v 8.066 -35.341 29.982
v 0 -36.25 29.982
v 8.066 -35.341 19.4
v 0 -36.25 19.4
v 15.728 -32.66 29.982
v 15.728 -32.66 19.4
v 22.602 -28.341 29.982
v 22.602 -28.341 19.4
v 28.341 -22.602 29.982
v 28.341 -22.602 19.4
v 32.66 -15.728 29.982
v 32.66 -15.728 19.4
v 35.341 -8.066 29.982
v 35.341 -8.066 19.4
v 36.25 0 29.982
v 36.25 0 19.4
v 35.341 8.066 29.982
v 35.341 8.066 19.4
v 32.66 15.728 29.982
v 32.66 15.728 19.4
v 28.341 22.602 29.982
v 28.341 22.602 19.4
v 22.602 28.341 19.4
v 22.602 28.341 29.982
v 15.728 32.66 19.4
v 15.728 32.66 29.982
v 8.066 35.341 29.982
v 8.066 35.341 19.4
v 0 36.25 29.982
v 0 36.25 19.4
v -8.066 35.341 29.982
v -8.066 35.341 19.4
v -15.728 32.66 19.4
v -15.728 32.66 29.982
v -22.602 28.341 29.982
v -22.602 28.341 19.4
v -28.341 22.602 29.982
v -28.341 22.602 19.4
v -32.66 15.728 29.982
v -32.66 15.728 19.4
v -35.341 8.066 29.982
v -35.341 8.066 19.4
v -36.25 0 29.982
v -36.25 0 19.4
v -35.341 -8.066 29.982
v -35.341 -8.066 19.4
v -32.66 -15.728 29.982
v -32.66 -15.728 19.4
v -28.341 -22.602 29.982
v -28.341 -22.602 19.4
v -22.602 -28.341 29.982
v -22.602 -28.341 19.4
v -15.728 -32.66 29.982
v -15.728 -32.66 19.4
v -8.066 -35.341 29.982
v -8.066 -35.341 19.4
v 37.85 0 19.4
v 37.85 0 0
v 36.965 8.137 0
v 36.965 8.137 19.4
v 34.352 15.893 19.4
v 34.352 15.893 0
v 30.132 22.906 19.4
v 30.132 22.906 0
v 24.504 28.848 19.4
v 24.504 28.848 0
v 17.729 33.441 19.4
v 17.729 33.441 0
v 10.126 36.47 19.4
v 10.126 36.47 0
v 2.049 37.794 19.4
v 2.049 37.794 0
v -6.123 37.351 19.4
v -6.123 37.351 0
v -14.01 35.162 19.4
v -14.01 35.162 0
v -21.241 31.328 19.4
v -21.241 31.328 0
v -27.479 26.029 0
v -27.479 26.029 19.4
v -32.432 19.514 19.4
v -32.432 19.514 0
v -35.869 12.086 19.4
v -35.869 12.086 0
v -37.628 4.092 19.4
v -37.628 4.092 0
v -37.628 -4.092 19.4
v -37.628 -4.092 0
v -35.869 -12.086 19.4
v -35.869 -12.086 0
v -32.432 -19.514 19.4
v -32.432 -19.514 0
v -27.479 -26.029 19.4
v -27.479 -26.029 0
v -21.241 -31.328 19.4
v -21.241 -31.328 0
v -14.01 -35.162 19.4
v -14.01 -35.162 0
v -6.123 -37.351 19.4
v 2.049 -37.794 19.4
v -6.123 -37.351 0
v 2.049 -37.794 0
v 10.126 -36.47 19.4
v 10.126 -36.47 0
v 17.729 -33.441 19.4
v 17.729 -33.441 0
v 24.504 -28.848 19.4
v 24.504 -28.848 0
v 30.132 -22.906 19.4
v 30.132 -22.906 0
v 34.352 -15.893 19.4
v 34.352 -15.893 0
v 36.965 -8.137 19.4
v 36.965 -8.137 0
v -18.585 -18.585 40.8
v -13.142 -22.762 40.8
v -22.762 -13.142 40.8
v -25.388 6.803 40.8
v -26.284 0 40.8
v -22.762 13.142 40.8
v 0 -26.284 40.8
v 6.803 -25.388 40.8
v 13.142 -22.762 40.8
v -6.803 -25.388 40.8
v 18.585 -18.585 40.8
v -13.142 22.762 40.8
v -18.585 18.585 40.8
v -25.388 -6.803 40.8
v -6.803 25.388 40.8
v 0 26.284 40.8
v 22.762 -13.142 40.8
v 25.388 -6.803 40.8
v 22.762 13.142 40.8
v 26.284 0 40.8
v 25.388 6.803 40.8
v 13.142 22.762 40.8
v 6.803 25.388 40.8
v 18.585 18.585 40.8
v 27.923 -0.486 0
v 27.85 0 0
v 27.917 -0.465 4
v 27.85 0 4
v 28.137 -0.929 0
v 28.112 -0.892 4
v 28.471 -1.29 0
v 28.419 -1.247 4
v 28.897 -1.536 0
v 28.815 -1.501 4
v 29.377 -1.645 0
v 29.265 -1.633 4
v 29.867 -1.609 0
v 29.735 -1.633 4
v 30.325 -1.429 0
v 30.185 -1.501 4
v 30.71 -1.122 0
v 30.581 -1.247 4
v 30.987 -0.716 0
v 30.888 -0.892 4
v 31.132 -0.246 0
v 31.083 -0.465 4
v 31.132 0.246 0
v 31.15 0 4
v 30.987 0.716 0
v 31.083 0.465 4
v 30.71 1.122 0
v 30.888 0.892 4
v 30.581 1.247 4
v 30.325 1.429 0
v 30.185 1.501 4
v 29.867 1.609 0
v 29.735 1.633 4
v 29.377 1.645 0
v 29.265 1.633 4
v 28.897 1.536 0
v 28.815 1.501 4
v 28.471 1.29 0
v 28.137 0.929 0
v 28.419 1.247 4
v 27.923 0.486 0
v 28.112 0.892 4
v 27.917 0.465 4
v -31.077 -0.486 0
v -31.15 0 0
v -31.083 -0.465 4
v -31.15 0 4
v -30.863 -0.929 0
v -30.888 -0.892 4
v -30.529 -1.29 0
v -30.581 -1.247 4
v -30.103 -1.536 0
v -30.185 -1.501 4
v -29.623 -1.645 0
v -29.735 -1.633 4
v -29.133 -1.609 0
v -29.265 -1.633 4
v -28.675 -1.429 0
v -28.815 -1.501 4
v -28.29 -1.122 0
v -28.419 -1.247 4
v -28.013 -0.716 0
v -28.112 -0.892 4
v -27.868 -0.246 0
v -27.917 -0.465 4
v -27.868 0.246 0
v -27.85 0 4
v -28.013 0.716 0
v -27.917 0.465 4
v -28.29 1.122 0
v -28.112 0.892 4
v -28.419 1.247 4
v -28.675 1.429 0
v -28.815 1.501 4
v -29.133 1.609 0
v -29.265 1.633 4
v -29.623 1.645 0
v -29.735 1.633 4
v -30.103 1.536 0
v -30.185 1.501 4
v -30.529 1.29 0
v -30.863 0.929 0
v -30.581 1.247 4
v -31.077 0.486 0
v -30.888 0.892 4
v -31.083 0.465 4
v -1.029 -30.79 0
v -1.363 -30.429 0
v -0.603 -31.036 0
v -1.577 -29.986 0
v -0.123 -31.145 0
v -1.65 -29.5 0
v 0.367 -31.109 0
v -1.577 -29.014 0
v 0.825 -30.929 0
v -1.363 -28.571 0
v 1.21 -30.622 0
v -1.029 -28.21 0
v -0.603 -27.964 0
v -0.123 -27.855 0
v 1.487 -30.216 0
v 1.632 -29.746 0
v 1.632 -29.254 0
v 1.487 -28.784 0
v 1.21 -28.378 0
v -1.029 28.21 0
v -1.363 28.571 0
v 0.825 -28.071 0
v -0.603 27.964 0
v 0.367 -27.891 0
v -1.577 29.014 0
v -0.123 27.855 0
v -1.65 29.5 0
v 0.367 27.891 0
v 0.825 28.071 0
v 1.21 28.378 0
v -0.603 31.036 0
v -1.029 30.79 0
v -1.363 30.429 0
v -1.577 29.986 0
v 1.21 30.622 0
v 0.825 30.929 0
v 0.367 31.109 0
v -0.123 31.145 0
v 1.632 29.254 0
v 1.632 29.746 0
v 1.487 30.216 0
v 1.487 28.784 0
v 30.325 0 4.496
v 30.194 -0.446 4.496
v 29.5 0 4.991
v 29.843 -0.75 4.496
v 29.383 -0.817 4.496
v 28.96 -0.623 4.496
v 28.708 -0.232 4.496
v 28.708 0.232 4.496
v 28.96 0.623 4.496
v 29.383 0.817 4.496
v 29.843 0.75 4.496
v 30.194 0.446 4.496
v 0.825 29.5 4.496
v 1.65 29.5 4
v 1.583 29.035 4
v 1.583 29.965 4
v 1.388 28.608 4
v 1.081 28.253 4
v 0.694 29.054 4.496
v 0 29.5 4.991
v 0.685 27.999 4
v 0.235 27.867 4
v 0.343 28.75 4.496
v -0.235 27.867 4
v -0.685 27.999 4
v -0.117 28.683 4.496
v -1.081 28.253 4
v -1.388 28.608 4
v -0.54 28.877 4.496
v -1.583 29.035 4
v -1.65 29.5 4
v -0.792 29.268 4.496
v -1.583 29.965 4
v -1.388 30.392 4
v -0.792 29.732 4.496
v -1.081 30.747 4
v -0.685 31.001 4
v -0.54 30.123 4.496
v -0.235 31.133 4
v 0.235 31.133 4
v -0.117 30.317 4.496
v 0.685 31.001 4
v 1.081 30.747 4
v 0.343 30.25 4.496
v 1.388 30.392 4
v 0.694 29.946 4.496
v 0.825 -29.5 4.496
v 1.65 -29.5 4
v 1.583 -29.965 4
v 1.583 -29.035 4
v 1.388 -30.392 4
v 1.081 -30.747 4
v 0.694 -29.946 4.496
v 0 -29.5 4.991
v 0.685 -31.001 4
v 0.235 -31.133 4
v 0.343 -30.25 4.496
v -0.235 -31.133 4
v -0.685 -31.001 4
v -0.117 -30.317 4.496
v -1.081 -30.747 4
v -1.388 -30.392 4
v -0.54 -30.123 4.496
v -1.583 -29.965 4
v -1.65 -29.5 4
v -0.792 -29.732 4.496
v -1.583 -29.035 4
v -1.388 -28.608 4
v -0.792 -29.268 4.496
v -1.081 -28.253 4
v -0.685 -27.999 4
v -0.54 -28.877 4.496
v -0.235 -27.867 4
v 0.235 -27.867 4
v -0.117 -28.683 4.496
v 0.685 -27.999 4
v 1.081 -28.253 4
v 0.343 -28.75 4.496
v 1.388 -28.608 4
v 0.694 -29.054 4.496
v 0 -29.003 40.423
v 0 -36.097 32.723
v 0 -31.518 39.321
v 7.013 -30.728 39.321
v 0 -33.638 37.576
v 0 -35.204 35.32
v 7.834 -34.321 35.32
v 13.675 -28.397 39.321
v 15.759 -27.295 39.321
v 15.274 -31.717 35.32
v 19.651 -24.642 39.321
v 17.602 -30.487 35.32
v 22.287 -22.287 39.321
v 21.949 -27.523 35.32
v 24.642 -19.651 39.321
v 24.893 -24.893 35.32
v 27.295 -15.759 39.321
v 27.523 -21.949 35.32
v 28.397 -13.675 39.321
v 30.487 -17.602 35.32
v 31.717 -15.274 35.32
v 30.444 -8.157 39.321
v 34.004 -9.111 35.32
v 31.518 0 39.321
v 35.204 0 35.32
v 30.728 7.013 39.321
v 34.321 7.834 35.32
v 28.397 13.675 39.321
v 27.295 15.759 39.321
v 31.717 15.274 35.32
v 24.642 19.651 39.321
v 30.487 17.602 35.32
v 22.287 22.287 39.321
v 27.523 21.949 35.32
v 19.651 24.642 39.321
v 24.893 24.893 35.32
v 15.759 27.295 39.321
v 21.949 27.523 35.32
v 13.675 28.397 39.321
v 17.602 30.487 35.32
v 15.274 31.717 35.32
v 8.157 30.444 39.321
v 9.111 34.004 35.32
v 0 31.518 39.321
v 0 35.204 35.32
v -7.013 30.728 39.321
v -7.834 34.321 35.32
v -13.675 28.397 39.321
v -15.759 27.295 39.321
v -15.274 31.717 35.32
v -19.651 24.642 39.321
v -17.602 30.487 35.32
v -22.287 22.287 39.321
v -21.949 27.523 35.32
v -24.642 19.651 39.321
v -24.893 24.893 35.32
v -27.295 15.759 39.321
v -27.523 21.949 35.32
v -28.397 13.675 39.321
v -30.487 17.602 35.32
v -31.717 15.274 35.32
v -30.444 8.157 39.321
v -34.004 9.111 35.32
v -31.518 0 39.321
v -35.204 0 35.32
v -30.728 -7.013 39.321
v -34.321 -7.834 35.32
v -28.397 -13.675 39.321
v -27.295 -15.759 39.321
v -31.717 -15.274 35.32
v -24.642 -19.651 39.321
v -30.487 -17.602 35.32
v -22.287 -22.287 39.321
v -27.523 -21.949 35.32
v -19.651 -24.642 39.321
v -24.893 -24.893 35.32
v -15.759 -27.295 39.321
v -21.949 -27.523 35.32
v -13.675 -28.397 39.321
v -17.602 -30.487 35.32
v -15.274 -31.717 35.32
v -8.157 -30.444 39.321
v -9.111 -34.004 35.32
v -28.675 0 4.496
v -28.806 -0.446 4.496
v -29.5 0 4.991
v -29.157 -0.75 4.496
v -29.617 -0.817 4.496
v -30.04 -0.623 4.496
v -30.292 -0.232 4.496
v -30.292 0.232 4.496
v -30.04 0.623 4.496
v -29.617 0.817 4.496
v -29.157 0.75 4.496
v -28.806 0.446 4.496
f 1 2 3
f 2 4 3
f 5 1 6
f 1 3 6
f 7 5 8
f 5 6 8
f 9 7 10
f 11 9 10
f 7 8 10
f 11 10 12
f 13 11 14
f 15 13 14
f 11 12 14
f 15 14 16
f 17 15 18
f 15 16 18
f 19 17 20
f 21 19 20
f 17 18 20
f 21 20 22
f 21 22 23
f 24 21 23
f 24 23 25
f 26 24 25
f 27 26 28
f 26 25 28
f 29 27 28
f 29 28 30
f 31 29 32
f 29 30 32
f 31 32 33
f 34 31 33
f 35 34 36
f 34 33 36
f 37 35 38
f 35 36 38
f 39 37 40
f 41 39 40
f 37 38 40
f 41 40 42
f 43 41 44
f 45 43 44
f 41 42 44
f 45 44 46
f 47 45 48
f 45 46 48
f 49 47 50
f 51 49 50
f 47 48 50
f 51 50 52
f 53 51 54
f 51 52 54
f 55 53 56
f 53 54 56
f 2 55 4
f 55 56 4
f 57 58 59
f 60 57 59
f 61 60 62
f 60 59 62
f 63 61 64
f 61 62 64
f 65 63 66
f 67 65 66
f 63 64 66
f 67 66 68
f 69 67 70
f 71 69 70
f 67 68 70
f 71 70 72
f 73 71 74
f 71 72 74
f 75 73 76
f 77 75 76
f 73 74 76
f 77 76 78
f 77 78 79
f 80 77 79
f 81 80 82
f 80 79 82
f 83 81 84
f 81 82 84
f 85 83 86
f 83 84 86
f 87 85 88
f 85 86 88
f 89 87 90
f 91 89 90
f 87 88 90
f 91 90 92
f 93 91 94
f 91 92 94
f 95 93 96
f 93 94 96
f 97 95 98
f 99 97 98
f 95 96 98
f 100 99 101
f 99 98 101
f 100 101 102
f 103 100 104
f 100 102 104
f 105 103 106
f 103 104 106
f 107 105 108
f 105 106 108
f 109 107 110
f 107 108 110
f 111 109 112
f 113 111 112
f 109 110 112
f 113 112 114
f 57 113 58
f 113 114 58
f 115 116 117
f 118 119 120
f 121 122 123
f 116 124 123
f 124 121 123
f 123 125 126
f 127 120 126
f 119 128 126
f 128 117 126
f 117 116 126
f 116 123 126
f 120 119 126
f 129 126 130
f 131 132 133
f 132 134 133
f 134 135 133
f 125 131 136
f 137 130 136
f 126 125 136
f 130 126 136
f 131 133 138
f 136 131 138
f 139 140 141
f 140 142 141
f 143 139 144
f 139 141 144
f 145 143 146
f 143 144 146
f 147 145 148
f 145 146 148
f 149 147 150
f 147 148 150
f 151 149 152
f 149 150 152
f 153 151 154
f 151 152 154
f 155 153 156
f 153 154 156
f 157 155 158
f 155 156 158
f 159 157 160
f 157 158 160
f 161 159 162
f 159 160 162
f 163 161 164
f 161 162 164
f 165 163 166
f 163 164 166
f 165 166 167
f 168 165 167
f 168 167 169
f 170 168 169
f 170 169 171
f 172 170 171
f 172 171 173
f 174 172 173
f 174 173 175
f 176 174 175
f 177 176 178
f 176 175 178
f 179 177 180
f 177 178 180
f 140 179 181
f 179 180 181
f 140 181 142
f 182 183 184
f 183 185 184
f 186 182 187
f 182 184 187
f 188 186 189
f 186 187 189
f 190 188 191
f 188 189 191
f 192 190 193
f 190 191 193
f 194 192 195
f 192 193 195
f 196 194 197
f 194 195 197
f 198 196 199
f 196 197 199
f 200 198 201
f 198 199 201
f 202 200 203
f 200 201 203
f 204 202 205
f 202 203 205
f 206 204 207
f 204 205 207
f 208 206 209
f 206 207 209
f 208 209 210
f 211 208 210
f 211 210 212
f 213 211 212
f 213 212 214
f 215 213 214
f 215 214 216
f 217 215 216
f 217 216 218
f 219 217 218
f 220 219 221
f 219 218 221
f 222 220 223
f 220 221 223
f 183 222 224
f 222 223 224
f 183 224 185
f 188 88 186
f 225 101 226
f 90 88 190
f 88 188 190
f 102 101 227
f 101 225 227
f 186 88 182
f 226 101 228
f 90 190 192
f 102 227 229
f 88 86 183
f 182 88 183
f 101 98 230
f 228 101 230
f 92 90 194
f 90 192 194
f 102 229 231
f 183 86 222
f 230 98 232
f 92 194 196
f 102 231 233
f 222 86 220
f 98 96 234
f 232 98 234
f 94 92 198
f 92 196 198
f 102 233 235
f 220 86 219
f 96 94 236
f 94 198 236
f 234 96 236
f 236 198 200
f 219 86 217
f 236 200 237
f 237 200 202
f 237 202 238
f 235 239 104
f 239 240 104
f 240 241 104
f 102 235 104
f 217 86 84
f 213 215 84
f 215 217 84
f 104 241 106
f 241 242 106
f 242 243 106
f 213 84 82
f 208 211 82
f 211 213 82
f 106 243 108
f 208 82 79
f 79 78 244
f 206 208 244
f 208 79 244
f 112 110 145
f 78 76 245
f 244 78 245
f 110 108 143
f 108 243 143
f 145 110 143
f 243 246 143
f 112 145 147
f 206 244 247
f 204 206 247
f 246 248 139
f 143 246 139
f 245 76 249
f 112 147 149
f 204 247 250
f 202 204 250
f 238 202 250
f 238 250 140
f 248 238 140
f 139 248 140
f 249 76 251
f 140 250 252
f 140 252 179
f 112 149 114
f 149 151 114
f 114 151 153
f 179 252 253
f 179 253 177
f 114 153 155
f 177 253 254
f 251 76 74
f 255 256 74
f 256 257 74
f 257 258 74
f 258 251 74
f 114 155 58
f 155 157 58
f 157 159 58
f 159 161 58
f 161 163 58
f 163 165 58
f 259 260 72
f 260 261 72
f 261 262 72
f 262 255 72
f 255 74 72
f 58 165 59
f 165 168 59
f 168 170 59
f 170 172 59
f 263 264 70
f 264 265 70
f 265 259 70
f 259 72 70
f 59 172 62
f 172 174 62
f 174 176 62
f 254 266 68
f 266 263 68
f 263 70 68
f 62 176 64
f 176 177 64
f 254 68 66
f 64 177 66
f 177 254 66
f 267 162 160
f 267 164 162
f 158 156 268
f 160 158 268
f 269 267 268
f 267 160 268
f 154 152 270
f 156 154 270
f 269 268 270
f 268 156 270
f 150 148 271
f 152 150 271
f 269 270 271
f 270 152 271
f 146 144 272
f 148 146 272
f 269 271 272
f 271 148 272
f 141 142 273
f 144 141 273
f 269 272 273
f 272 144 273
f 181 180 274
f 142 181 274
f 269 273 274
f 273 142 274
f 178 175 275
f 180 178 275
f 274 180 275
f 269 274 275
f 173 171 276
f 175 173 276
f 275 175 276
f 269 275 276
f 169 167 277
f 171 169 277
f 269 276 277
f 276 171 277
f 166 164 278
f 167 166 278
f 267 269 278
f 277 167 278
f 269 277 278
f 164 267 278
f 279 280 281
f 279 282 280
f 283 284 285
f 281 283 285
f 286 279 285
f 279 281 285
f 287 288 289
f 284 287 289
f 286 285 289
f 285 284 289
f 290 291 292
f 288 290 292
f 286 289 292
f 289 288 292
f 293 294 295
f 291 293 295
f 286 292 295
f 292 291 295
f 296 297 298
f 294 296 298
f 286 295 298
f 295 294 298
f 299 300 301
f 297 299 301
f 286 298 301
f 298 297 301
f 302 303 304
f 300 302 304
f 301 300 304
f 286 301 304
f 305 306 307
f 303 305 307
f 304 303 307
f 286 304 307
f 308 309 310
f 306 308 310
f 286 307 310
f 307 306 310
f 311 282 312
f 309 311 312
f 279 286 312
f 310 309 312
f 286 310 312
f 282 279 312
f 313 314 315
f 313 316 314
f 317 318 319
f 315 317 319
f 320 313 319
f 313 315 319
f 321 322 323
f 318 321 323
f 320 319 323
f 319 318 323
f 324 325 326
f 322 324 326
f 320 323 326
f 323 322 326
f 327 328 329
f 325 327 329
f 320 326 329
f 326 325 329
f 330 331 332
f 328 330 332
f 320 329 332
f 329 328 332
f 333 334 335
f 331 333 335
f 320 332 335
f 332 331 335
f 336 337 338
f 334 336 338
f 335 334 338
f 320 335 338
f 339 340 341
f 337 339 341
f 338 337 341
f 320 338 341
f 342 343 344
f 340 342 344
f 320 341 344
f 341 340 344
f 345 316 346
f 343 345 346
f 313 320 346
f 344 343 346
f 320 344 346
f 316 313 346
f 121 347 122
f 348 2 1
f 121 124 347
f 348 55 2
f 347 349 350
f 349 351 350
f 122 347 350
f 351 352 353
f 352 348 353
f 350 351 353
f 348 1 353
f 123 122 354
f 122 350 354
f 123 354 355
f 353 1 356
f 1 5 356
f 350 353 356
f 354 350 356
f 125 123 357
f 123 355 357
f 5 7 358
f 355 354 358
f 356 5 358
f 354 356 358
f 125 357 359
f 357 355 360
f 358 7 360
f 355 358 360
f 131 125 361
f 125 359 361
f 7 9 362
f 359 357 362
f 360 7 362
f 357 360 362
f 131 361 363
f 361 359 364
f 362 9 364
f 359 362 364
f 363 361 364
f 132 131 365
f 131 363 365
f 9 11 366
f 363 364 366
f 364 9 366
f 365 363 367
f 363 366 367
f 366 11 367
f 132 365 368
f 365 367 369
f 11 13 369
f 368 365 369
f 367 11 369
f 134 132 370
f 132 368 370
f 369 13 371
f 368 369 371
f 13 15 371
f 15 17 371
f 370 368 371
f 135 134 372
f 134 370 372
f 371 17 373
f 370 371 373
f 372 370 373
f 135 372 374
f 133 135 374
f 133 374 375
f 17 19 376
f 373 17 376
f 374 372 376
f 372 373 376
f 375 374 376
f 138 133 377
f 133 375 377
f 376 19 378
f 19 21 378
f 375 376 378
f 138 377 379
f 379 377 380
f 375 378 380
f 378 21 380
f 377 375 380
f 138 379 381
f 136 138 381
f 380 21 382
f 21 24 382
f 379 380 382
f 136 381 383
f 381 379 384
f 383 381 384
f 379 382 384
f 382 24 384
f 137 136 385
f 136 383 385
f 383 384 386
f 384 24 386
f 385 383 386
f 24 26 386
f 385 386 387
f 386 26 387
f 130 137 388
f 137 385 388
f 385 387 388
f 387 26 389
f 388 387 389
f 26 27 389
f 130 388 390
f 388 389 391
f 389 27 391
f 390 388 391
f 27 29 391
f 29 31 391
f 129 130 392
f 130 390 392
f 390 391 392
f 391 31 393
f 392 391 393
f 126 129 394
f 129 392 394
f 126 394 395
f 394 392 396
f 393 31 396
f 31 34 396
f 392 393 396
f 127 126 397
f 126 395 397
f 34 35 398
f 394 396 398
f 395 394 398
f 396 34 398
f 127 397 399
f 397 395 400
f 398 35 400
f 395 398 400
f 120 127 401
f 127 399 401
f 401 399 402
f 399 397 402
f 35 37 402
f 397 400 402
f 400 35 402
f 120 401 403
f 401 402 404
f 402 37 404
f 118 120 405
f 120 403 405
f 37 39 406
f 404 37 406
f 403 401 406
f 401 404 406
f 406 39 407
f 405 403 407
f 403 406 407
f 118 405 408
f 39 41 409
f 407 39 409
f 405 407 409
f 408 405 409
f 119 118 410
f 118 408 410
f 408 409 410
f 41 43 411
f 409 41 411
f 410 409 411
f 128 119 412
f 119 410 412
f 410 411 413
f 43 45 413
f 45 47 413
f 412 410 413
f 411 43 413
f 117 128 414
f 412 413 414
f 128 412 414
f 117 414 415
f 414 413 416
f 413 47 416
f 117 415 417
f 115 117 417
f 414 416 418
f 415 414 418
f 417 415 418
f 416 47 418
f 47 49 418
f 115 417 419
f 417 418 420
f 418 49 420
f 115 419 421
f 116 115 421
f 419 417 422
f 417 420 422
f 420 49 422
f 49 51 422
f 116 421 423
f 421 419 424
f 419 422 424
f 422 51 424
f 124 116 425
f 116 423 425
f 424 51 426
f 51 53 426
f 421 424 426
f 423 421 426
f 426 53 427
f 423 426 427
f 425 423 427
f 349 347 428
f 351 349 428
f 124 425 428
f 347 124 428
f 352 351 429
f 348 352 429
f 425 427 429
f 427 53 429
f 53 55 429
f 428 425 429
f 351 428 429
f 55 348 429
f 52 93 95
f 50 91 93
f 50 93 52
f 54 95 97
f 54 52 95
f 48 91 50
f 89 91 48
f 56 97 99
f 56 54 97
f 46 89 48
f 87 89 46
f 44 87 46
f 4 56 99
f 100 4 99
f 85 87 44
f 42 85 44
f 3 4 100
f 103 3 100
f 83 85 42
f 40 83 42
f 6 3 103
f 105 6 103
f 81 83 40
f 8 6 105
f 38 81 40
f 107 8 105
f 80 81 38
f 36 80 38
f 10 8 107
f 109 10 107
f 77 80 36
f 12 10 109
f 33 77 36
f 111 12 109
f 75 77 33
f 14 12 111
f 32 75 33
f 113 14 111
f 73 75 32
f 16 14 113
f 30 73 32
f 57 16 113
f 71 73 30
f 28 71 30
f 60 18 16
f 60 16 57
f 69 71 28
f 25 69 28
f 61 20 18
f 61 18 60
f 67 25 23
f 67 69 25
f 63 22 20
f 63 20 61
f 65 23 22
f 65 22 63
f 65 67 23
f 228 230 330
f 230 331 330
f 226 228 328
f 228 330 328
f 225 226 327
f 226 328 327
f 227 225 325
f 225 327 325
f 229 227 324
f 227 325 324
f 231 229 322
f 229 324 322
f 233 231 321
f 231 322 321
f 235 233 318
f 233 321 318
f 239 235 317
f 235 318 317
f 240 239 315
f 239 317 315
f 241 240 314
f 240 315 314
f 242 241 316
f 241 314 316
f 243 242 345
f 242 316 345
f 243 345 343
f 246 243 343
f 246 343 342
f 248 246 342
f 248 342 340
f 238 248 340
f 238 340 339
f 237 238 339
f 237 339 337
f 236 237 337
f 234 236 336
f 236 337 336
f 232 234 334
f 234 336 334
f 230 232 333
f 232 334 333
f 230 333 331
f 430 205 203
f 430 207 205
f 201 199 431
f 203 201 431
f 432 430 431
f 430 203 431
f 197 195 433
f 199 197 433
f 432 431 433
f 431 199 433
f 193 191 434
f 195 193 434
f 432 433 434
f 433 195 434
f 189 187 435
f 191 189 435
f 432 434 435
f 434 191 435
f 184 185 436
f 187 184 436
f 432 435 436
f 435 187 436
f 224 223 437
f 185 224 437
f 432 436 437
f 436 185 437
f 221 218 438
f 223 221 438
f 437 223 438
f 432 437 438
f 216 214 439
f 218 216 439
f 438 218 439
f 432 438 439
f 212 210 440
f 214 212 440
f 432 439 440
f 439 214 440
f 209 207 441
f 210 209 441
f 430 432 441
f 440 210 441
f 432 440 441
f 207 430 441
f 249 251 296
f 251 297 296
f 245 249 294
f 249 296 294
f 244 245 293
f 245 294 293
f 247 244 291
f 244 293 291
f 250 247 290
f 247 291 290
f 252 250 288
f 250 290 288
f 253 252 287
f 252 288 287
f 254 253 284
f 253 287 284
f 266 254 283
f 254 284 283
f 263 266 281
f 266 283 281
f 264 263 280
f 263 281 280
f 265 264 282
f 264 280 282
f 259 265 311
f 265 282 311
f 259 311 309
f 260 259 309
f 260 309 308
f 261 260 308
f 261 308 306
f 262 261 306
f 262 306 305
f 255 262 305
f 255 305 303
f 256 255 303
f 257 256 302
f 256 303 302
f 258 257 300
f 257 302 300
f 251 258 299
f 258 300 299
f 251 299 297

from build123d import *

# Parameters (mm, degrees)
F0_R     = 37.85
F1_DEPTH = 19.4
F3_D     = 3.3
F3_DEPTH = 4
F3_TIP   = 0.9914200214


with BuildPart() as f1:
    # F0 (on Top) → F1 (new body)
    with BuildSketch(Plane.XY):
        Circle(F0_R)
    extrude(amount=F1_DEPTH)

    # F3
    with Locations(Plane(origin=(0, 0, 0), x_dir=(1, 0, 0), z_dir=(0, 0, -1))):
        with Locations((0, 29.5), (-29.5, 0), (0, -29.5), (29.5, 0)):
            Hole(F3_D / 2, depth=F3_DEPTH)
            with Locations((0, 0, -(F3_DEPTH + F3_TIP / 2))):  # 118° drill point
                Cone(0, F3_D / 2, F3_TIP, mode=Mode.SUBTRACT)

    # F4 (on Right) → F5 (revolve)
    with BuildSketch(Plane.YZ):
        with BuildLine():
            Line((-36.25, 29.9819558859), (-36.25, 19.4))
            Line((-36.25, 19.4), (0, 19.4))
            Line((0, 19.4), (0, 40.8))
            Line((0, 40.8), (-26.2835159747, 40.8))
            ThreePointArc((-26.2835159747, 40.8), (-33.6381213734, 37.57567557), (-36.25, 29.9819558859))
        make_face()
    revolve(axis=Axis((0, 0, 30.1), (0, 0, 1)))


solid = f1.part
